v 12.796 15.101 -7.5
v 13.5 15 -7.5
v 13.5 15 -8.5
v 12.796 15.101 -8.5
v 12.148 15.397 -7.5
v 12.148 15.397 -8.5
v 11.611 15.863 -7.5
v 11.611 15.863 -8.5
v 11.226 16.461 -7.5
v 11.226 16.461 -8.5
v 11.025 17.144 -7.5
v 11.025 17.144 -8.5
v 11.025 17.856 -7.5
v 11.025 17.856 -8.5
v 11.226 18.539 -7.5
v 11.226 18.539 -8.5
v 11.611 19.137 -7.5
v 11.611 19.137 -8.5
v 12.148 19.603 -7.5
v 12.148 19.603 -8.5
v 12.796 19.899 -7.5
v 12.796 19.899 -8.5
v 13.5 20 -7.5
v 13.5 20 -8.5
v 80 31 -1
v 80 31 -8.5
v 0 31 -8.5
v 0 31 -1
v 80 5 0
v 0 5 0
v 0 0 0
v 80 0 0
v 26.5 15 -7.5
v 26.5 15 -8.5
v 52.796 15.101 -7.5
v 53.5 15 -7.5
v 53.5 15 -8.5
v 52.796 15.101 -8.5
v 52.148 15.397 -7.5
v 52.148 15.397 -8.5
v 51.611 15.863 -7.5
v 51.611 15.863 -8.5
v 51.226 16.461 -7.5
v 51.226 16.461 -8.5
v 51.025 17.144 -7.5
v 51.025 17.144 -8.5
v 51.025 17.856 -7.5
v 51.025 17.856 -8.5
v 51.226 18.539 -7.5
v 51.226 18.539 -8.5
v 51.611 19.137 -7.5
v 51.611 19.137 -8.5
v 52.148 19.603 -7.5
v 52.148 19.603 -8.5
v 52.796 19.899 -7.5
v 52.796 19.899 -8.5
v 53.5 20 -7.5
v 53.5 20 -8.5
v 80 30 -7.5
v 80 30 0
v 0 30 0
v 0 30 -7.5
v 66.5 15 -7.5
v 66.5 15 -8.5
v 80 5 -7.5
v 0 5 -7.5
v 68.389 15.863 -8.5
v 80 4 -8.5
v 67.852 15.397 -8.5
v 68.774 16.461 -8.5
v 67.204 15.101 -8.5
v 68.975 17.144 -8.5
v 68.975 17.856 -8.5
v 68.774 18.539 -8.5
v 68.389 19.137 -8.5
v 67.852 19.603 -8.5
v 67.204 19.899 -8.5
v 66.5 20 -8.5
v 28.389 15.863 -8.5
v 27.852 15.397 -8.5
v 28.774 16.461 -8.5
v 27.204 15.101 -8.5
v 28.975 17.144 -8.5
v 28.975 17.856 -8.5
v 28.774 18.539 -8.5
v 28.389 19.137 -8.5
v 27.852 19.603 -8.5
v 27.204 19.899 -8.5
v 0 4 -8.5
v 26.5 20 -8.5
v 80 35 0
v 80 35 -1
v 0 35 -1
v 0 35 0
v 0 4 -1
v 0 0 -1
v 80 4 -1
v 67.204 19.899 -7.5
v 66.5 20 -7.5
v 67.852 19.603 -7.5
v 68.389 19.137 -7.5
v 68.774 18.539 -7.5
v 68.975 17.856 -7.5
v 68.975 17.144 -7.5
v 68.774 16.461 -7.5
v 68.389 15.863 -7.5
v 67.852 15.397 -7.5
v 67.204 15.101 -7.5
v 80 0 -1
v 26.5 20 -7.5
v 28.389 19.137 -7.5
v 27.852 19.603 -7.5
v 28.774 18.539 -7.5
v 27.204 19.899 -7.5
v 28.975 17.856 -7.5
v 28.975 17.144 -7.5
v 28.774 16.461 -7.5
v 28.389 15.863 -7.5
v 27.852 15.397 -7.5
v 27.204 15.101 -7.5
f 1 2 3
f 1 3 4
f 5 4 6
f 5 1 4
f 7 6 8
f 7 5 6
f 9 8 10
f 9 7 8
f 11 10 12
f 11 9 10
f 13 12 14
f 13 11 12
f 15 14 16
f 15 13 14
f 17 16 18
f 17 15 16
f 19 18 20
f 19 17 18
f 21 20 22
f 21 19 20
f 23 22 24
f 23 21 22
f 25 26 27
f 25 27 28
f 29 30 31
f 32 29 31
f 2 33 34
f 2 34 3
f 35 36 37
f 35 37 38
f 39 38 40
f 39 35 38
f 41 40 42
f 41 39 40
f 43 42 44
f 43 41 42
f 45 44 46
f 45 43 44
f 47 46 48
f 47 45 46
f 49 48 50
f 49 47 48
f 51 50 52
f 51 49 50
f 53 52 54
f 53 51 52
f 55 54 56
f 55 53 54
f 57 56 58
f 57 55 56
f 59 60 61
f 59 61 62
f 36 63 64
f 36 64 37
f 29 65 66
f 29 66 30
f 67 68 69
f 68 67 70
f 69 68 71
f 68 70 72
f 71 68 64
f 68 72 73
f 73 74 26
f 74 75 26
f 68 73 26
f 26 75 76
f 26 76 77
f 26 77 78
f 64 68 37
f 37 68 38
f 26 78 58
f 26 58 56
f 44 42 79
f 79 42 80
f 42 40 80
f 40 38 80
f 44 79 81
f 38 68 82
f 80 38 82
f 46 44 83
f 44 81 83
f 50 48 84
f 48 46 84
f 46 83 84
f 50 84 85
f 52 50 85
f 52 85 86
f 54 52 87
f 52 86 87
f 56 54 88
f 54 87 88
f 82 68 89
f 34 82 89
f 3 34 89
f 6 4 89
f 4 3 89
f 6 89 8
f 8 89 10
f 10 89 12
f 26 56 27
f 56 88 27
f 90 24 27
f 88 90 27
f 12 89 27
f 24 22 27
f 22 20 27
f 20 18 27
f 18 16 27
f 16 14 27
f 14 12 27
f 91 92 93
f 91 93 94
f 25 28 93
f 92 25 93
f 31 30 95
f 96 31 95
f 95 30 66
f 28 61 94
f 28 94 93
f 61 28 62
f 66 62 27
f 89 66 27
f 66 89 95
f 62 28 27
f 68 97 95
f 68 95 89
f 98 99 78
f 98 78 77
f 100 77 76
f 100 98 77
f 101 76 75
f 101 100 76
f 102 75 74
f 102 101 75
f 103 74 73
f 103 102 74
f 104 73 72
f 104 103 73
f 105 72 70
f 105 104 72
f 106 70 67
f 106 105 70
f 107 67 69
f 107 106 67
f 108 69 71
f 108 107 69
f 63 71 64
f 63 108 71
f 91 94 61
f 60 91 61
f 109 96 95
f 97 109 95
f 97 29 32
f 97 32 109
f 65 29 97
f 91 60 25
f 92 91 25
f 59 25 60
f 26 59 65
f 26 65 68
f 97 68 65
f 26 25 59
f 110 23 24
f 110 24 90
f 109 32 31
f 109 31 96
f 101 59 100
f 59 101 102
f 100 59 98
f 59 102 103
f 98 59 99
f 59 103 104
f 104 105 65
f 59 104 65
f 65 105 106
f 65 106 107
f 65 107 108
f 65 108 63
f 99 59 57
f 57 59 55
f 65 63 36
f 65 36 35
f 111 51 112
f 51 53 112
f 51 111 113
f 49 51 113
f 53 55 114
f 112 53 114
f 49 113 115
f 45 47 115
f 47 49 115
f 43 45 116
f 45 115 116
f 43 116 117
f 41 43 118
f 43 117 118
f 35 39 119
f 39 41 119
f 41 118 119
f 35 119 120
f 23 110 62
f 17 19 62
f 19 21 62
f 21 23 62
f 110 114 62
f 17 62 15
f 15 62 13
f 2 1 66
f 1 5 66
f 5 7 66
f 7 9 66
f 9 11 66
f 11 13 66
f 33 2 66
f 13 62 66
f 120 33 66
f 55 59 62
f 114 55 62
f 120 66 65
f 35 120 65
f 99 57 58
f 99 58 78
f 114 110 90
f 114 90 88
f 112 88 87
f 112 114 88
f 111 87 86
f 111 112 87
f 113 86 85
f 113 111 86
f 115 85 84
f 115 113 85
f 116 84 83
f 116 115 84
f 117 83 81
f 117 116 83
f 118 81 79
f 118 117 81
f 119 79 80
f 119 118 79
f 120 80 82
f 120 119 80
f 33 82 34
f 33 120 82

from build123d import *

# Parameters (mm, degrees)
ESTRUSIONE_ESTRUSIONE1_DEPTH = 80
TAGLIO_ESTRUSIONE1_REACH     = 89.643


with BuildPart() as part:
    # Schizzo1 → Estrusione-Estrusione1 (new body)
    with BuildSketch(Plane(origin=(0, 0, 0), x_dir=(0, 0, -1), z_dir=(1, 0, 0))):
        Polygon((0, 35), (0, 30), (7.5, 30), (7.5, 5), (0, 5), (0, 0), (1, 0), (1, 4), (8.5, 4), (8.5, 31), (1, 31), (1, 35), align=None)
    extrude(amount=ESTRUSIONE_ESTRUSIONE1_DEPTH)

    # Schizzo2 → Taglio-Estrusione1 (cut, up to next)
    with BuildSketch(Plane.XY.offset(-7.5), mode=Mode.PRIVATE) as taglio_estrusione1_sk1:
        with BuildLine():
            Line((13.5, 20), (26.5, 20))
            ThreePointArc((26.5, 20), (29, 17.5), (26.5, 15))
            Line((26.5, 15), (13.5, 15))
            ThreePointArc((13.5, 15), (11, 17.5), (13.5, 20))
        make_face()
    taglio_estrusione1_tool1 = extrude(taglio_estrusione1_sk1.sketch, amount=-TAGLIO_ESTRUSIONE1_REACH, mode=Mode.PRIVATE) & part.part
    # Schizzo2 → Taglio-Estrusione1 (cut, up to next)
    with BuildSketch(Plane.XY.offset(-7.5), mode=Mode.PRIVATE) as taglio_estrusione1_sk2:
        with BuildLine():
            Line((53.5, 20), (66.5, 20))
            ThreePointArc((66.5, 20), (69, 17.5), (66.5, 15))
            Line((66.5, 15), (53.5, 15))
            ThreePointArc((53.5, 15), (51, 17.5), (53.5, 20))
        make_face()
    taglio_estrusione1_tool2 = extrude(taglio_estrusione1_sk2.sketch, amount=-TAGLIO_ESTRUSIONE1_REACH, mode=Mode.PRIVATE) & part.part
    add(taglio_estrusione1_tool1.solids().sort_by_distance((20, 17.5, -7.5))[0], mode=Mode.SUBTRACT)
    add(taglio_estrusione1_tool2.solids().sort_by_distance((60, 17.5, -7.5))[0], mode=Mode.SUBTRACT)


solid = part.part
